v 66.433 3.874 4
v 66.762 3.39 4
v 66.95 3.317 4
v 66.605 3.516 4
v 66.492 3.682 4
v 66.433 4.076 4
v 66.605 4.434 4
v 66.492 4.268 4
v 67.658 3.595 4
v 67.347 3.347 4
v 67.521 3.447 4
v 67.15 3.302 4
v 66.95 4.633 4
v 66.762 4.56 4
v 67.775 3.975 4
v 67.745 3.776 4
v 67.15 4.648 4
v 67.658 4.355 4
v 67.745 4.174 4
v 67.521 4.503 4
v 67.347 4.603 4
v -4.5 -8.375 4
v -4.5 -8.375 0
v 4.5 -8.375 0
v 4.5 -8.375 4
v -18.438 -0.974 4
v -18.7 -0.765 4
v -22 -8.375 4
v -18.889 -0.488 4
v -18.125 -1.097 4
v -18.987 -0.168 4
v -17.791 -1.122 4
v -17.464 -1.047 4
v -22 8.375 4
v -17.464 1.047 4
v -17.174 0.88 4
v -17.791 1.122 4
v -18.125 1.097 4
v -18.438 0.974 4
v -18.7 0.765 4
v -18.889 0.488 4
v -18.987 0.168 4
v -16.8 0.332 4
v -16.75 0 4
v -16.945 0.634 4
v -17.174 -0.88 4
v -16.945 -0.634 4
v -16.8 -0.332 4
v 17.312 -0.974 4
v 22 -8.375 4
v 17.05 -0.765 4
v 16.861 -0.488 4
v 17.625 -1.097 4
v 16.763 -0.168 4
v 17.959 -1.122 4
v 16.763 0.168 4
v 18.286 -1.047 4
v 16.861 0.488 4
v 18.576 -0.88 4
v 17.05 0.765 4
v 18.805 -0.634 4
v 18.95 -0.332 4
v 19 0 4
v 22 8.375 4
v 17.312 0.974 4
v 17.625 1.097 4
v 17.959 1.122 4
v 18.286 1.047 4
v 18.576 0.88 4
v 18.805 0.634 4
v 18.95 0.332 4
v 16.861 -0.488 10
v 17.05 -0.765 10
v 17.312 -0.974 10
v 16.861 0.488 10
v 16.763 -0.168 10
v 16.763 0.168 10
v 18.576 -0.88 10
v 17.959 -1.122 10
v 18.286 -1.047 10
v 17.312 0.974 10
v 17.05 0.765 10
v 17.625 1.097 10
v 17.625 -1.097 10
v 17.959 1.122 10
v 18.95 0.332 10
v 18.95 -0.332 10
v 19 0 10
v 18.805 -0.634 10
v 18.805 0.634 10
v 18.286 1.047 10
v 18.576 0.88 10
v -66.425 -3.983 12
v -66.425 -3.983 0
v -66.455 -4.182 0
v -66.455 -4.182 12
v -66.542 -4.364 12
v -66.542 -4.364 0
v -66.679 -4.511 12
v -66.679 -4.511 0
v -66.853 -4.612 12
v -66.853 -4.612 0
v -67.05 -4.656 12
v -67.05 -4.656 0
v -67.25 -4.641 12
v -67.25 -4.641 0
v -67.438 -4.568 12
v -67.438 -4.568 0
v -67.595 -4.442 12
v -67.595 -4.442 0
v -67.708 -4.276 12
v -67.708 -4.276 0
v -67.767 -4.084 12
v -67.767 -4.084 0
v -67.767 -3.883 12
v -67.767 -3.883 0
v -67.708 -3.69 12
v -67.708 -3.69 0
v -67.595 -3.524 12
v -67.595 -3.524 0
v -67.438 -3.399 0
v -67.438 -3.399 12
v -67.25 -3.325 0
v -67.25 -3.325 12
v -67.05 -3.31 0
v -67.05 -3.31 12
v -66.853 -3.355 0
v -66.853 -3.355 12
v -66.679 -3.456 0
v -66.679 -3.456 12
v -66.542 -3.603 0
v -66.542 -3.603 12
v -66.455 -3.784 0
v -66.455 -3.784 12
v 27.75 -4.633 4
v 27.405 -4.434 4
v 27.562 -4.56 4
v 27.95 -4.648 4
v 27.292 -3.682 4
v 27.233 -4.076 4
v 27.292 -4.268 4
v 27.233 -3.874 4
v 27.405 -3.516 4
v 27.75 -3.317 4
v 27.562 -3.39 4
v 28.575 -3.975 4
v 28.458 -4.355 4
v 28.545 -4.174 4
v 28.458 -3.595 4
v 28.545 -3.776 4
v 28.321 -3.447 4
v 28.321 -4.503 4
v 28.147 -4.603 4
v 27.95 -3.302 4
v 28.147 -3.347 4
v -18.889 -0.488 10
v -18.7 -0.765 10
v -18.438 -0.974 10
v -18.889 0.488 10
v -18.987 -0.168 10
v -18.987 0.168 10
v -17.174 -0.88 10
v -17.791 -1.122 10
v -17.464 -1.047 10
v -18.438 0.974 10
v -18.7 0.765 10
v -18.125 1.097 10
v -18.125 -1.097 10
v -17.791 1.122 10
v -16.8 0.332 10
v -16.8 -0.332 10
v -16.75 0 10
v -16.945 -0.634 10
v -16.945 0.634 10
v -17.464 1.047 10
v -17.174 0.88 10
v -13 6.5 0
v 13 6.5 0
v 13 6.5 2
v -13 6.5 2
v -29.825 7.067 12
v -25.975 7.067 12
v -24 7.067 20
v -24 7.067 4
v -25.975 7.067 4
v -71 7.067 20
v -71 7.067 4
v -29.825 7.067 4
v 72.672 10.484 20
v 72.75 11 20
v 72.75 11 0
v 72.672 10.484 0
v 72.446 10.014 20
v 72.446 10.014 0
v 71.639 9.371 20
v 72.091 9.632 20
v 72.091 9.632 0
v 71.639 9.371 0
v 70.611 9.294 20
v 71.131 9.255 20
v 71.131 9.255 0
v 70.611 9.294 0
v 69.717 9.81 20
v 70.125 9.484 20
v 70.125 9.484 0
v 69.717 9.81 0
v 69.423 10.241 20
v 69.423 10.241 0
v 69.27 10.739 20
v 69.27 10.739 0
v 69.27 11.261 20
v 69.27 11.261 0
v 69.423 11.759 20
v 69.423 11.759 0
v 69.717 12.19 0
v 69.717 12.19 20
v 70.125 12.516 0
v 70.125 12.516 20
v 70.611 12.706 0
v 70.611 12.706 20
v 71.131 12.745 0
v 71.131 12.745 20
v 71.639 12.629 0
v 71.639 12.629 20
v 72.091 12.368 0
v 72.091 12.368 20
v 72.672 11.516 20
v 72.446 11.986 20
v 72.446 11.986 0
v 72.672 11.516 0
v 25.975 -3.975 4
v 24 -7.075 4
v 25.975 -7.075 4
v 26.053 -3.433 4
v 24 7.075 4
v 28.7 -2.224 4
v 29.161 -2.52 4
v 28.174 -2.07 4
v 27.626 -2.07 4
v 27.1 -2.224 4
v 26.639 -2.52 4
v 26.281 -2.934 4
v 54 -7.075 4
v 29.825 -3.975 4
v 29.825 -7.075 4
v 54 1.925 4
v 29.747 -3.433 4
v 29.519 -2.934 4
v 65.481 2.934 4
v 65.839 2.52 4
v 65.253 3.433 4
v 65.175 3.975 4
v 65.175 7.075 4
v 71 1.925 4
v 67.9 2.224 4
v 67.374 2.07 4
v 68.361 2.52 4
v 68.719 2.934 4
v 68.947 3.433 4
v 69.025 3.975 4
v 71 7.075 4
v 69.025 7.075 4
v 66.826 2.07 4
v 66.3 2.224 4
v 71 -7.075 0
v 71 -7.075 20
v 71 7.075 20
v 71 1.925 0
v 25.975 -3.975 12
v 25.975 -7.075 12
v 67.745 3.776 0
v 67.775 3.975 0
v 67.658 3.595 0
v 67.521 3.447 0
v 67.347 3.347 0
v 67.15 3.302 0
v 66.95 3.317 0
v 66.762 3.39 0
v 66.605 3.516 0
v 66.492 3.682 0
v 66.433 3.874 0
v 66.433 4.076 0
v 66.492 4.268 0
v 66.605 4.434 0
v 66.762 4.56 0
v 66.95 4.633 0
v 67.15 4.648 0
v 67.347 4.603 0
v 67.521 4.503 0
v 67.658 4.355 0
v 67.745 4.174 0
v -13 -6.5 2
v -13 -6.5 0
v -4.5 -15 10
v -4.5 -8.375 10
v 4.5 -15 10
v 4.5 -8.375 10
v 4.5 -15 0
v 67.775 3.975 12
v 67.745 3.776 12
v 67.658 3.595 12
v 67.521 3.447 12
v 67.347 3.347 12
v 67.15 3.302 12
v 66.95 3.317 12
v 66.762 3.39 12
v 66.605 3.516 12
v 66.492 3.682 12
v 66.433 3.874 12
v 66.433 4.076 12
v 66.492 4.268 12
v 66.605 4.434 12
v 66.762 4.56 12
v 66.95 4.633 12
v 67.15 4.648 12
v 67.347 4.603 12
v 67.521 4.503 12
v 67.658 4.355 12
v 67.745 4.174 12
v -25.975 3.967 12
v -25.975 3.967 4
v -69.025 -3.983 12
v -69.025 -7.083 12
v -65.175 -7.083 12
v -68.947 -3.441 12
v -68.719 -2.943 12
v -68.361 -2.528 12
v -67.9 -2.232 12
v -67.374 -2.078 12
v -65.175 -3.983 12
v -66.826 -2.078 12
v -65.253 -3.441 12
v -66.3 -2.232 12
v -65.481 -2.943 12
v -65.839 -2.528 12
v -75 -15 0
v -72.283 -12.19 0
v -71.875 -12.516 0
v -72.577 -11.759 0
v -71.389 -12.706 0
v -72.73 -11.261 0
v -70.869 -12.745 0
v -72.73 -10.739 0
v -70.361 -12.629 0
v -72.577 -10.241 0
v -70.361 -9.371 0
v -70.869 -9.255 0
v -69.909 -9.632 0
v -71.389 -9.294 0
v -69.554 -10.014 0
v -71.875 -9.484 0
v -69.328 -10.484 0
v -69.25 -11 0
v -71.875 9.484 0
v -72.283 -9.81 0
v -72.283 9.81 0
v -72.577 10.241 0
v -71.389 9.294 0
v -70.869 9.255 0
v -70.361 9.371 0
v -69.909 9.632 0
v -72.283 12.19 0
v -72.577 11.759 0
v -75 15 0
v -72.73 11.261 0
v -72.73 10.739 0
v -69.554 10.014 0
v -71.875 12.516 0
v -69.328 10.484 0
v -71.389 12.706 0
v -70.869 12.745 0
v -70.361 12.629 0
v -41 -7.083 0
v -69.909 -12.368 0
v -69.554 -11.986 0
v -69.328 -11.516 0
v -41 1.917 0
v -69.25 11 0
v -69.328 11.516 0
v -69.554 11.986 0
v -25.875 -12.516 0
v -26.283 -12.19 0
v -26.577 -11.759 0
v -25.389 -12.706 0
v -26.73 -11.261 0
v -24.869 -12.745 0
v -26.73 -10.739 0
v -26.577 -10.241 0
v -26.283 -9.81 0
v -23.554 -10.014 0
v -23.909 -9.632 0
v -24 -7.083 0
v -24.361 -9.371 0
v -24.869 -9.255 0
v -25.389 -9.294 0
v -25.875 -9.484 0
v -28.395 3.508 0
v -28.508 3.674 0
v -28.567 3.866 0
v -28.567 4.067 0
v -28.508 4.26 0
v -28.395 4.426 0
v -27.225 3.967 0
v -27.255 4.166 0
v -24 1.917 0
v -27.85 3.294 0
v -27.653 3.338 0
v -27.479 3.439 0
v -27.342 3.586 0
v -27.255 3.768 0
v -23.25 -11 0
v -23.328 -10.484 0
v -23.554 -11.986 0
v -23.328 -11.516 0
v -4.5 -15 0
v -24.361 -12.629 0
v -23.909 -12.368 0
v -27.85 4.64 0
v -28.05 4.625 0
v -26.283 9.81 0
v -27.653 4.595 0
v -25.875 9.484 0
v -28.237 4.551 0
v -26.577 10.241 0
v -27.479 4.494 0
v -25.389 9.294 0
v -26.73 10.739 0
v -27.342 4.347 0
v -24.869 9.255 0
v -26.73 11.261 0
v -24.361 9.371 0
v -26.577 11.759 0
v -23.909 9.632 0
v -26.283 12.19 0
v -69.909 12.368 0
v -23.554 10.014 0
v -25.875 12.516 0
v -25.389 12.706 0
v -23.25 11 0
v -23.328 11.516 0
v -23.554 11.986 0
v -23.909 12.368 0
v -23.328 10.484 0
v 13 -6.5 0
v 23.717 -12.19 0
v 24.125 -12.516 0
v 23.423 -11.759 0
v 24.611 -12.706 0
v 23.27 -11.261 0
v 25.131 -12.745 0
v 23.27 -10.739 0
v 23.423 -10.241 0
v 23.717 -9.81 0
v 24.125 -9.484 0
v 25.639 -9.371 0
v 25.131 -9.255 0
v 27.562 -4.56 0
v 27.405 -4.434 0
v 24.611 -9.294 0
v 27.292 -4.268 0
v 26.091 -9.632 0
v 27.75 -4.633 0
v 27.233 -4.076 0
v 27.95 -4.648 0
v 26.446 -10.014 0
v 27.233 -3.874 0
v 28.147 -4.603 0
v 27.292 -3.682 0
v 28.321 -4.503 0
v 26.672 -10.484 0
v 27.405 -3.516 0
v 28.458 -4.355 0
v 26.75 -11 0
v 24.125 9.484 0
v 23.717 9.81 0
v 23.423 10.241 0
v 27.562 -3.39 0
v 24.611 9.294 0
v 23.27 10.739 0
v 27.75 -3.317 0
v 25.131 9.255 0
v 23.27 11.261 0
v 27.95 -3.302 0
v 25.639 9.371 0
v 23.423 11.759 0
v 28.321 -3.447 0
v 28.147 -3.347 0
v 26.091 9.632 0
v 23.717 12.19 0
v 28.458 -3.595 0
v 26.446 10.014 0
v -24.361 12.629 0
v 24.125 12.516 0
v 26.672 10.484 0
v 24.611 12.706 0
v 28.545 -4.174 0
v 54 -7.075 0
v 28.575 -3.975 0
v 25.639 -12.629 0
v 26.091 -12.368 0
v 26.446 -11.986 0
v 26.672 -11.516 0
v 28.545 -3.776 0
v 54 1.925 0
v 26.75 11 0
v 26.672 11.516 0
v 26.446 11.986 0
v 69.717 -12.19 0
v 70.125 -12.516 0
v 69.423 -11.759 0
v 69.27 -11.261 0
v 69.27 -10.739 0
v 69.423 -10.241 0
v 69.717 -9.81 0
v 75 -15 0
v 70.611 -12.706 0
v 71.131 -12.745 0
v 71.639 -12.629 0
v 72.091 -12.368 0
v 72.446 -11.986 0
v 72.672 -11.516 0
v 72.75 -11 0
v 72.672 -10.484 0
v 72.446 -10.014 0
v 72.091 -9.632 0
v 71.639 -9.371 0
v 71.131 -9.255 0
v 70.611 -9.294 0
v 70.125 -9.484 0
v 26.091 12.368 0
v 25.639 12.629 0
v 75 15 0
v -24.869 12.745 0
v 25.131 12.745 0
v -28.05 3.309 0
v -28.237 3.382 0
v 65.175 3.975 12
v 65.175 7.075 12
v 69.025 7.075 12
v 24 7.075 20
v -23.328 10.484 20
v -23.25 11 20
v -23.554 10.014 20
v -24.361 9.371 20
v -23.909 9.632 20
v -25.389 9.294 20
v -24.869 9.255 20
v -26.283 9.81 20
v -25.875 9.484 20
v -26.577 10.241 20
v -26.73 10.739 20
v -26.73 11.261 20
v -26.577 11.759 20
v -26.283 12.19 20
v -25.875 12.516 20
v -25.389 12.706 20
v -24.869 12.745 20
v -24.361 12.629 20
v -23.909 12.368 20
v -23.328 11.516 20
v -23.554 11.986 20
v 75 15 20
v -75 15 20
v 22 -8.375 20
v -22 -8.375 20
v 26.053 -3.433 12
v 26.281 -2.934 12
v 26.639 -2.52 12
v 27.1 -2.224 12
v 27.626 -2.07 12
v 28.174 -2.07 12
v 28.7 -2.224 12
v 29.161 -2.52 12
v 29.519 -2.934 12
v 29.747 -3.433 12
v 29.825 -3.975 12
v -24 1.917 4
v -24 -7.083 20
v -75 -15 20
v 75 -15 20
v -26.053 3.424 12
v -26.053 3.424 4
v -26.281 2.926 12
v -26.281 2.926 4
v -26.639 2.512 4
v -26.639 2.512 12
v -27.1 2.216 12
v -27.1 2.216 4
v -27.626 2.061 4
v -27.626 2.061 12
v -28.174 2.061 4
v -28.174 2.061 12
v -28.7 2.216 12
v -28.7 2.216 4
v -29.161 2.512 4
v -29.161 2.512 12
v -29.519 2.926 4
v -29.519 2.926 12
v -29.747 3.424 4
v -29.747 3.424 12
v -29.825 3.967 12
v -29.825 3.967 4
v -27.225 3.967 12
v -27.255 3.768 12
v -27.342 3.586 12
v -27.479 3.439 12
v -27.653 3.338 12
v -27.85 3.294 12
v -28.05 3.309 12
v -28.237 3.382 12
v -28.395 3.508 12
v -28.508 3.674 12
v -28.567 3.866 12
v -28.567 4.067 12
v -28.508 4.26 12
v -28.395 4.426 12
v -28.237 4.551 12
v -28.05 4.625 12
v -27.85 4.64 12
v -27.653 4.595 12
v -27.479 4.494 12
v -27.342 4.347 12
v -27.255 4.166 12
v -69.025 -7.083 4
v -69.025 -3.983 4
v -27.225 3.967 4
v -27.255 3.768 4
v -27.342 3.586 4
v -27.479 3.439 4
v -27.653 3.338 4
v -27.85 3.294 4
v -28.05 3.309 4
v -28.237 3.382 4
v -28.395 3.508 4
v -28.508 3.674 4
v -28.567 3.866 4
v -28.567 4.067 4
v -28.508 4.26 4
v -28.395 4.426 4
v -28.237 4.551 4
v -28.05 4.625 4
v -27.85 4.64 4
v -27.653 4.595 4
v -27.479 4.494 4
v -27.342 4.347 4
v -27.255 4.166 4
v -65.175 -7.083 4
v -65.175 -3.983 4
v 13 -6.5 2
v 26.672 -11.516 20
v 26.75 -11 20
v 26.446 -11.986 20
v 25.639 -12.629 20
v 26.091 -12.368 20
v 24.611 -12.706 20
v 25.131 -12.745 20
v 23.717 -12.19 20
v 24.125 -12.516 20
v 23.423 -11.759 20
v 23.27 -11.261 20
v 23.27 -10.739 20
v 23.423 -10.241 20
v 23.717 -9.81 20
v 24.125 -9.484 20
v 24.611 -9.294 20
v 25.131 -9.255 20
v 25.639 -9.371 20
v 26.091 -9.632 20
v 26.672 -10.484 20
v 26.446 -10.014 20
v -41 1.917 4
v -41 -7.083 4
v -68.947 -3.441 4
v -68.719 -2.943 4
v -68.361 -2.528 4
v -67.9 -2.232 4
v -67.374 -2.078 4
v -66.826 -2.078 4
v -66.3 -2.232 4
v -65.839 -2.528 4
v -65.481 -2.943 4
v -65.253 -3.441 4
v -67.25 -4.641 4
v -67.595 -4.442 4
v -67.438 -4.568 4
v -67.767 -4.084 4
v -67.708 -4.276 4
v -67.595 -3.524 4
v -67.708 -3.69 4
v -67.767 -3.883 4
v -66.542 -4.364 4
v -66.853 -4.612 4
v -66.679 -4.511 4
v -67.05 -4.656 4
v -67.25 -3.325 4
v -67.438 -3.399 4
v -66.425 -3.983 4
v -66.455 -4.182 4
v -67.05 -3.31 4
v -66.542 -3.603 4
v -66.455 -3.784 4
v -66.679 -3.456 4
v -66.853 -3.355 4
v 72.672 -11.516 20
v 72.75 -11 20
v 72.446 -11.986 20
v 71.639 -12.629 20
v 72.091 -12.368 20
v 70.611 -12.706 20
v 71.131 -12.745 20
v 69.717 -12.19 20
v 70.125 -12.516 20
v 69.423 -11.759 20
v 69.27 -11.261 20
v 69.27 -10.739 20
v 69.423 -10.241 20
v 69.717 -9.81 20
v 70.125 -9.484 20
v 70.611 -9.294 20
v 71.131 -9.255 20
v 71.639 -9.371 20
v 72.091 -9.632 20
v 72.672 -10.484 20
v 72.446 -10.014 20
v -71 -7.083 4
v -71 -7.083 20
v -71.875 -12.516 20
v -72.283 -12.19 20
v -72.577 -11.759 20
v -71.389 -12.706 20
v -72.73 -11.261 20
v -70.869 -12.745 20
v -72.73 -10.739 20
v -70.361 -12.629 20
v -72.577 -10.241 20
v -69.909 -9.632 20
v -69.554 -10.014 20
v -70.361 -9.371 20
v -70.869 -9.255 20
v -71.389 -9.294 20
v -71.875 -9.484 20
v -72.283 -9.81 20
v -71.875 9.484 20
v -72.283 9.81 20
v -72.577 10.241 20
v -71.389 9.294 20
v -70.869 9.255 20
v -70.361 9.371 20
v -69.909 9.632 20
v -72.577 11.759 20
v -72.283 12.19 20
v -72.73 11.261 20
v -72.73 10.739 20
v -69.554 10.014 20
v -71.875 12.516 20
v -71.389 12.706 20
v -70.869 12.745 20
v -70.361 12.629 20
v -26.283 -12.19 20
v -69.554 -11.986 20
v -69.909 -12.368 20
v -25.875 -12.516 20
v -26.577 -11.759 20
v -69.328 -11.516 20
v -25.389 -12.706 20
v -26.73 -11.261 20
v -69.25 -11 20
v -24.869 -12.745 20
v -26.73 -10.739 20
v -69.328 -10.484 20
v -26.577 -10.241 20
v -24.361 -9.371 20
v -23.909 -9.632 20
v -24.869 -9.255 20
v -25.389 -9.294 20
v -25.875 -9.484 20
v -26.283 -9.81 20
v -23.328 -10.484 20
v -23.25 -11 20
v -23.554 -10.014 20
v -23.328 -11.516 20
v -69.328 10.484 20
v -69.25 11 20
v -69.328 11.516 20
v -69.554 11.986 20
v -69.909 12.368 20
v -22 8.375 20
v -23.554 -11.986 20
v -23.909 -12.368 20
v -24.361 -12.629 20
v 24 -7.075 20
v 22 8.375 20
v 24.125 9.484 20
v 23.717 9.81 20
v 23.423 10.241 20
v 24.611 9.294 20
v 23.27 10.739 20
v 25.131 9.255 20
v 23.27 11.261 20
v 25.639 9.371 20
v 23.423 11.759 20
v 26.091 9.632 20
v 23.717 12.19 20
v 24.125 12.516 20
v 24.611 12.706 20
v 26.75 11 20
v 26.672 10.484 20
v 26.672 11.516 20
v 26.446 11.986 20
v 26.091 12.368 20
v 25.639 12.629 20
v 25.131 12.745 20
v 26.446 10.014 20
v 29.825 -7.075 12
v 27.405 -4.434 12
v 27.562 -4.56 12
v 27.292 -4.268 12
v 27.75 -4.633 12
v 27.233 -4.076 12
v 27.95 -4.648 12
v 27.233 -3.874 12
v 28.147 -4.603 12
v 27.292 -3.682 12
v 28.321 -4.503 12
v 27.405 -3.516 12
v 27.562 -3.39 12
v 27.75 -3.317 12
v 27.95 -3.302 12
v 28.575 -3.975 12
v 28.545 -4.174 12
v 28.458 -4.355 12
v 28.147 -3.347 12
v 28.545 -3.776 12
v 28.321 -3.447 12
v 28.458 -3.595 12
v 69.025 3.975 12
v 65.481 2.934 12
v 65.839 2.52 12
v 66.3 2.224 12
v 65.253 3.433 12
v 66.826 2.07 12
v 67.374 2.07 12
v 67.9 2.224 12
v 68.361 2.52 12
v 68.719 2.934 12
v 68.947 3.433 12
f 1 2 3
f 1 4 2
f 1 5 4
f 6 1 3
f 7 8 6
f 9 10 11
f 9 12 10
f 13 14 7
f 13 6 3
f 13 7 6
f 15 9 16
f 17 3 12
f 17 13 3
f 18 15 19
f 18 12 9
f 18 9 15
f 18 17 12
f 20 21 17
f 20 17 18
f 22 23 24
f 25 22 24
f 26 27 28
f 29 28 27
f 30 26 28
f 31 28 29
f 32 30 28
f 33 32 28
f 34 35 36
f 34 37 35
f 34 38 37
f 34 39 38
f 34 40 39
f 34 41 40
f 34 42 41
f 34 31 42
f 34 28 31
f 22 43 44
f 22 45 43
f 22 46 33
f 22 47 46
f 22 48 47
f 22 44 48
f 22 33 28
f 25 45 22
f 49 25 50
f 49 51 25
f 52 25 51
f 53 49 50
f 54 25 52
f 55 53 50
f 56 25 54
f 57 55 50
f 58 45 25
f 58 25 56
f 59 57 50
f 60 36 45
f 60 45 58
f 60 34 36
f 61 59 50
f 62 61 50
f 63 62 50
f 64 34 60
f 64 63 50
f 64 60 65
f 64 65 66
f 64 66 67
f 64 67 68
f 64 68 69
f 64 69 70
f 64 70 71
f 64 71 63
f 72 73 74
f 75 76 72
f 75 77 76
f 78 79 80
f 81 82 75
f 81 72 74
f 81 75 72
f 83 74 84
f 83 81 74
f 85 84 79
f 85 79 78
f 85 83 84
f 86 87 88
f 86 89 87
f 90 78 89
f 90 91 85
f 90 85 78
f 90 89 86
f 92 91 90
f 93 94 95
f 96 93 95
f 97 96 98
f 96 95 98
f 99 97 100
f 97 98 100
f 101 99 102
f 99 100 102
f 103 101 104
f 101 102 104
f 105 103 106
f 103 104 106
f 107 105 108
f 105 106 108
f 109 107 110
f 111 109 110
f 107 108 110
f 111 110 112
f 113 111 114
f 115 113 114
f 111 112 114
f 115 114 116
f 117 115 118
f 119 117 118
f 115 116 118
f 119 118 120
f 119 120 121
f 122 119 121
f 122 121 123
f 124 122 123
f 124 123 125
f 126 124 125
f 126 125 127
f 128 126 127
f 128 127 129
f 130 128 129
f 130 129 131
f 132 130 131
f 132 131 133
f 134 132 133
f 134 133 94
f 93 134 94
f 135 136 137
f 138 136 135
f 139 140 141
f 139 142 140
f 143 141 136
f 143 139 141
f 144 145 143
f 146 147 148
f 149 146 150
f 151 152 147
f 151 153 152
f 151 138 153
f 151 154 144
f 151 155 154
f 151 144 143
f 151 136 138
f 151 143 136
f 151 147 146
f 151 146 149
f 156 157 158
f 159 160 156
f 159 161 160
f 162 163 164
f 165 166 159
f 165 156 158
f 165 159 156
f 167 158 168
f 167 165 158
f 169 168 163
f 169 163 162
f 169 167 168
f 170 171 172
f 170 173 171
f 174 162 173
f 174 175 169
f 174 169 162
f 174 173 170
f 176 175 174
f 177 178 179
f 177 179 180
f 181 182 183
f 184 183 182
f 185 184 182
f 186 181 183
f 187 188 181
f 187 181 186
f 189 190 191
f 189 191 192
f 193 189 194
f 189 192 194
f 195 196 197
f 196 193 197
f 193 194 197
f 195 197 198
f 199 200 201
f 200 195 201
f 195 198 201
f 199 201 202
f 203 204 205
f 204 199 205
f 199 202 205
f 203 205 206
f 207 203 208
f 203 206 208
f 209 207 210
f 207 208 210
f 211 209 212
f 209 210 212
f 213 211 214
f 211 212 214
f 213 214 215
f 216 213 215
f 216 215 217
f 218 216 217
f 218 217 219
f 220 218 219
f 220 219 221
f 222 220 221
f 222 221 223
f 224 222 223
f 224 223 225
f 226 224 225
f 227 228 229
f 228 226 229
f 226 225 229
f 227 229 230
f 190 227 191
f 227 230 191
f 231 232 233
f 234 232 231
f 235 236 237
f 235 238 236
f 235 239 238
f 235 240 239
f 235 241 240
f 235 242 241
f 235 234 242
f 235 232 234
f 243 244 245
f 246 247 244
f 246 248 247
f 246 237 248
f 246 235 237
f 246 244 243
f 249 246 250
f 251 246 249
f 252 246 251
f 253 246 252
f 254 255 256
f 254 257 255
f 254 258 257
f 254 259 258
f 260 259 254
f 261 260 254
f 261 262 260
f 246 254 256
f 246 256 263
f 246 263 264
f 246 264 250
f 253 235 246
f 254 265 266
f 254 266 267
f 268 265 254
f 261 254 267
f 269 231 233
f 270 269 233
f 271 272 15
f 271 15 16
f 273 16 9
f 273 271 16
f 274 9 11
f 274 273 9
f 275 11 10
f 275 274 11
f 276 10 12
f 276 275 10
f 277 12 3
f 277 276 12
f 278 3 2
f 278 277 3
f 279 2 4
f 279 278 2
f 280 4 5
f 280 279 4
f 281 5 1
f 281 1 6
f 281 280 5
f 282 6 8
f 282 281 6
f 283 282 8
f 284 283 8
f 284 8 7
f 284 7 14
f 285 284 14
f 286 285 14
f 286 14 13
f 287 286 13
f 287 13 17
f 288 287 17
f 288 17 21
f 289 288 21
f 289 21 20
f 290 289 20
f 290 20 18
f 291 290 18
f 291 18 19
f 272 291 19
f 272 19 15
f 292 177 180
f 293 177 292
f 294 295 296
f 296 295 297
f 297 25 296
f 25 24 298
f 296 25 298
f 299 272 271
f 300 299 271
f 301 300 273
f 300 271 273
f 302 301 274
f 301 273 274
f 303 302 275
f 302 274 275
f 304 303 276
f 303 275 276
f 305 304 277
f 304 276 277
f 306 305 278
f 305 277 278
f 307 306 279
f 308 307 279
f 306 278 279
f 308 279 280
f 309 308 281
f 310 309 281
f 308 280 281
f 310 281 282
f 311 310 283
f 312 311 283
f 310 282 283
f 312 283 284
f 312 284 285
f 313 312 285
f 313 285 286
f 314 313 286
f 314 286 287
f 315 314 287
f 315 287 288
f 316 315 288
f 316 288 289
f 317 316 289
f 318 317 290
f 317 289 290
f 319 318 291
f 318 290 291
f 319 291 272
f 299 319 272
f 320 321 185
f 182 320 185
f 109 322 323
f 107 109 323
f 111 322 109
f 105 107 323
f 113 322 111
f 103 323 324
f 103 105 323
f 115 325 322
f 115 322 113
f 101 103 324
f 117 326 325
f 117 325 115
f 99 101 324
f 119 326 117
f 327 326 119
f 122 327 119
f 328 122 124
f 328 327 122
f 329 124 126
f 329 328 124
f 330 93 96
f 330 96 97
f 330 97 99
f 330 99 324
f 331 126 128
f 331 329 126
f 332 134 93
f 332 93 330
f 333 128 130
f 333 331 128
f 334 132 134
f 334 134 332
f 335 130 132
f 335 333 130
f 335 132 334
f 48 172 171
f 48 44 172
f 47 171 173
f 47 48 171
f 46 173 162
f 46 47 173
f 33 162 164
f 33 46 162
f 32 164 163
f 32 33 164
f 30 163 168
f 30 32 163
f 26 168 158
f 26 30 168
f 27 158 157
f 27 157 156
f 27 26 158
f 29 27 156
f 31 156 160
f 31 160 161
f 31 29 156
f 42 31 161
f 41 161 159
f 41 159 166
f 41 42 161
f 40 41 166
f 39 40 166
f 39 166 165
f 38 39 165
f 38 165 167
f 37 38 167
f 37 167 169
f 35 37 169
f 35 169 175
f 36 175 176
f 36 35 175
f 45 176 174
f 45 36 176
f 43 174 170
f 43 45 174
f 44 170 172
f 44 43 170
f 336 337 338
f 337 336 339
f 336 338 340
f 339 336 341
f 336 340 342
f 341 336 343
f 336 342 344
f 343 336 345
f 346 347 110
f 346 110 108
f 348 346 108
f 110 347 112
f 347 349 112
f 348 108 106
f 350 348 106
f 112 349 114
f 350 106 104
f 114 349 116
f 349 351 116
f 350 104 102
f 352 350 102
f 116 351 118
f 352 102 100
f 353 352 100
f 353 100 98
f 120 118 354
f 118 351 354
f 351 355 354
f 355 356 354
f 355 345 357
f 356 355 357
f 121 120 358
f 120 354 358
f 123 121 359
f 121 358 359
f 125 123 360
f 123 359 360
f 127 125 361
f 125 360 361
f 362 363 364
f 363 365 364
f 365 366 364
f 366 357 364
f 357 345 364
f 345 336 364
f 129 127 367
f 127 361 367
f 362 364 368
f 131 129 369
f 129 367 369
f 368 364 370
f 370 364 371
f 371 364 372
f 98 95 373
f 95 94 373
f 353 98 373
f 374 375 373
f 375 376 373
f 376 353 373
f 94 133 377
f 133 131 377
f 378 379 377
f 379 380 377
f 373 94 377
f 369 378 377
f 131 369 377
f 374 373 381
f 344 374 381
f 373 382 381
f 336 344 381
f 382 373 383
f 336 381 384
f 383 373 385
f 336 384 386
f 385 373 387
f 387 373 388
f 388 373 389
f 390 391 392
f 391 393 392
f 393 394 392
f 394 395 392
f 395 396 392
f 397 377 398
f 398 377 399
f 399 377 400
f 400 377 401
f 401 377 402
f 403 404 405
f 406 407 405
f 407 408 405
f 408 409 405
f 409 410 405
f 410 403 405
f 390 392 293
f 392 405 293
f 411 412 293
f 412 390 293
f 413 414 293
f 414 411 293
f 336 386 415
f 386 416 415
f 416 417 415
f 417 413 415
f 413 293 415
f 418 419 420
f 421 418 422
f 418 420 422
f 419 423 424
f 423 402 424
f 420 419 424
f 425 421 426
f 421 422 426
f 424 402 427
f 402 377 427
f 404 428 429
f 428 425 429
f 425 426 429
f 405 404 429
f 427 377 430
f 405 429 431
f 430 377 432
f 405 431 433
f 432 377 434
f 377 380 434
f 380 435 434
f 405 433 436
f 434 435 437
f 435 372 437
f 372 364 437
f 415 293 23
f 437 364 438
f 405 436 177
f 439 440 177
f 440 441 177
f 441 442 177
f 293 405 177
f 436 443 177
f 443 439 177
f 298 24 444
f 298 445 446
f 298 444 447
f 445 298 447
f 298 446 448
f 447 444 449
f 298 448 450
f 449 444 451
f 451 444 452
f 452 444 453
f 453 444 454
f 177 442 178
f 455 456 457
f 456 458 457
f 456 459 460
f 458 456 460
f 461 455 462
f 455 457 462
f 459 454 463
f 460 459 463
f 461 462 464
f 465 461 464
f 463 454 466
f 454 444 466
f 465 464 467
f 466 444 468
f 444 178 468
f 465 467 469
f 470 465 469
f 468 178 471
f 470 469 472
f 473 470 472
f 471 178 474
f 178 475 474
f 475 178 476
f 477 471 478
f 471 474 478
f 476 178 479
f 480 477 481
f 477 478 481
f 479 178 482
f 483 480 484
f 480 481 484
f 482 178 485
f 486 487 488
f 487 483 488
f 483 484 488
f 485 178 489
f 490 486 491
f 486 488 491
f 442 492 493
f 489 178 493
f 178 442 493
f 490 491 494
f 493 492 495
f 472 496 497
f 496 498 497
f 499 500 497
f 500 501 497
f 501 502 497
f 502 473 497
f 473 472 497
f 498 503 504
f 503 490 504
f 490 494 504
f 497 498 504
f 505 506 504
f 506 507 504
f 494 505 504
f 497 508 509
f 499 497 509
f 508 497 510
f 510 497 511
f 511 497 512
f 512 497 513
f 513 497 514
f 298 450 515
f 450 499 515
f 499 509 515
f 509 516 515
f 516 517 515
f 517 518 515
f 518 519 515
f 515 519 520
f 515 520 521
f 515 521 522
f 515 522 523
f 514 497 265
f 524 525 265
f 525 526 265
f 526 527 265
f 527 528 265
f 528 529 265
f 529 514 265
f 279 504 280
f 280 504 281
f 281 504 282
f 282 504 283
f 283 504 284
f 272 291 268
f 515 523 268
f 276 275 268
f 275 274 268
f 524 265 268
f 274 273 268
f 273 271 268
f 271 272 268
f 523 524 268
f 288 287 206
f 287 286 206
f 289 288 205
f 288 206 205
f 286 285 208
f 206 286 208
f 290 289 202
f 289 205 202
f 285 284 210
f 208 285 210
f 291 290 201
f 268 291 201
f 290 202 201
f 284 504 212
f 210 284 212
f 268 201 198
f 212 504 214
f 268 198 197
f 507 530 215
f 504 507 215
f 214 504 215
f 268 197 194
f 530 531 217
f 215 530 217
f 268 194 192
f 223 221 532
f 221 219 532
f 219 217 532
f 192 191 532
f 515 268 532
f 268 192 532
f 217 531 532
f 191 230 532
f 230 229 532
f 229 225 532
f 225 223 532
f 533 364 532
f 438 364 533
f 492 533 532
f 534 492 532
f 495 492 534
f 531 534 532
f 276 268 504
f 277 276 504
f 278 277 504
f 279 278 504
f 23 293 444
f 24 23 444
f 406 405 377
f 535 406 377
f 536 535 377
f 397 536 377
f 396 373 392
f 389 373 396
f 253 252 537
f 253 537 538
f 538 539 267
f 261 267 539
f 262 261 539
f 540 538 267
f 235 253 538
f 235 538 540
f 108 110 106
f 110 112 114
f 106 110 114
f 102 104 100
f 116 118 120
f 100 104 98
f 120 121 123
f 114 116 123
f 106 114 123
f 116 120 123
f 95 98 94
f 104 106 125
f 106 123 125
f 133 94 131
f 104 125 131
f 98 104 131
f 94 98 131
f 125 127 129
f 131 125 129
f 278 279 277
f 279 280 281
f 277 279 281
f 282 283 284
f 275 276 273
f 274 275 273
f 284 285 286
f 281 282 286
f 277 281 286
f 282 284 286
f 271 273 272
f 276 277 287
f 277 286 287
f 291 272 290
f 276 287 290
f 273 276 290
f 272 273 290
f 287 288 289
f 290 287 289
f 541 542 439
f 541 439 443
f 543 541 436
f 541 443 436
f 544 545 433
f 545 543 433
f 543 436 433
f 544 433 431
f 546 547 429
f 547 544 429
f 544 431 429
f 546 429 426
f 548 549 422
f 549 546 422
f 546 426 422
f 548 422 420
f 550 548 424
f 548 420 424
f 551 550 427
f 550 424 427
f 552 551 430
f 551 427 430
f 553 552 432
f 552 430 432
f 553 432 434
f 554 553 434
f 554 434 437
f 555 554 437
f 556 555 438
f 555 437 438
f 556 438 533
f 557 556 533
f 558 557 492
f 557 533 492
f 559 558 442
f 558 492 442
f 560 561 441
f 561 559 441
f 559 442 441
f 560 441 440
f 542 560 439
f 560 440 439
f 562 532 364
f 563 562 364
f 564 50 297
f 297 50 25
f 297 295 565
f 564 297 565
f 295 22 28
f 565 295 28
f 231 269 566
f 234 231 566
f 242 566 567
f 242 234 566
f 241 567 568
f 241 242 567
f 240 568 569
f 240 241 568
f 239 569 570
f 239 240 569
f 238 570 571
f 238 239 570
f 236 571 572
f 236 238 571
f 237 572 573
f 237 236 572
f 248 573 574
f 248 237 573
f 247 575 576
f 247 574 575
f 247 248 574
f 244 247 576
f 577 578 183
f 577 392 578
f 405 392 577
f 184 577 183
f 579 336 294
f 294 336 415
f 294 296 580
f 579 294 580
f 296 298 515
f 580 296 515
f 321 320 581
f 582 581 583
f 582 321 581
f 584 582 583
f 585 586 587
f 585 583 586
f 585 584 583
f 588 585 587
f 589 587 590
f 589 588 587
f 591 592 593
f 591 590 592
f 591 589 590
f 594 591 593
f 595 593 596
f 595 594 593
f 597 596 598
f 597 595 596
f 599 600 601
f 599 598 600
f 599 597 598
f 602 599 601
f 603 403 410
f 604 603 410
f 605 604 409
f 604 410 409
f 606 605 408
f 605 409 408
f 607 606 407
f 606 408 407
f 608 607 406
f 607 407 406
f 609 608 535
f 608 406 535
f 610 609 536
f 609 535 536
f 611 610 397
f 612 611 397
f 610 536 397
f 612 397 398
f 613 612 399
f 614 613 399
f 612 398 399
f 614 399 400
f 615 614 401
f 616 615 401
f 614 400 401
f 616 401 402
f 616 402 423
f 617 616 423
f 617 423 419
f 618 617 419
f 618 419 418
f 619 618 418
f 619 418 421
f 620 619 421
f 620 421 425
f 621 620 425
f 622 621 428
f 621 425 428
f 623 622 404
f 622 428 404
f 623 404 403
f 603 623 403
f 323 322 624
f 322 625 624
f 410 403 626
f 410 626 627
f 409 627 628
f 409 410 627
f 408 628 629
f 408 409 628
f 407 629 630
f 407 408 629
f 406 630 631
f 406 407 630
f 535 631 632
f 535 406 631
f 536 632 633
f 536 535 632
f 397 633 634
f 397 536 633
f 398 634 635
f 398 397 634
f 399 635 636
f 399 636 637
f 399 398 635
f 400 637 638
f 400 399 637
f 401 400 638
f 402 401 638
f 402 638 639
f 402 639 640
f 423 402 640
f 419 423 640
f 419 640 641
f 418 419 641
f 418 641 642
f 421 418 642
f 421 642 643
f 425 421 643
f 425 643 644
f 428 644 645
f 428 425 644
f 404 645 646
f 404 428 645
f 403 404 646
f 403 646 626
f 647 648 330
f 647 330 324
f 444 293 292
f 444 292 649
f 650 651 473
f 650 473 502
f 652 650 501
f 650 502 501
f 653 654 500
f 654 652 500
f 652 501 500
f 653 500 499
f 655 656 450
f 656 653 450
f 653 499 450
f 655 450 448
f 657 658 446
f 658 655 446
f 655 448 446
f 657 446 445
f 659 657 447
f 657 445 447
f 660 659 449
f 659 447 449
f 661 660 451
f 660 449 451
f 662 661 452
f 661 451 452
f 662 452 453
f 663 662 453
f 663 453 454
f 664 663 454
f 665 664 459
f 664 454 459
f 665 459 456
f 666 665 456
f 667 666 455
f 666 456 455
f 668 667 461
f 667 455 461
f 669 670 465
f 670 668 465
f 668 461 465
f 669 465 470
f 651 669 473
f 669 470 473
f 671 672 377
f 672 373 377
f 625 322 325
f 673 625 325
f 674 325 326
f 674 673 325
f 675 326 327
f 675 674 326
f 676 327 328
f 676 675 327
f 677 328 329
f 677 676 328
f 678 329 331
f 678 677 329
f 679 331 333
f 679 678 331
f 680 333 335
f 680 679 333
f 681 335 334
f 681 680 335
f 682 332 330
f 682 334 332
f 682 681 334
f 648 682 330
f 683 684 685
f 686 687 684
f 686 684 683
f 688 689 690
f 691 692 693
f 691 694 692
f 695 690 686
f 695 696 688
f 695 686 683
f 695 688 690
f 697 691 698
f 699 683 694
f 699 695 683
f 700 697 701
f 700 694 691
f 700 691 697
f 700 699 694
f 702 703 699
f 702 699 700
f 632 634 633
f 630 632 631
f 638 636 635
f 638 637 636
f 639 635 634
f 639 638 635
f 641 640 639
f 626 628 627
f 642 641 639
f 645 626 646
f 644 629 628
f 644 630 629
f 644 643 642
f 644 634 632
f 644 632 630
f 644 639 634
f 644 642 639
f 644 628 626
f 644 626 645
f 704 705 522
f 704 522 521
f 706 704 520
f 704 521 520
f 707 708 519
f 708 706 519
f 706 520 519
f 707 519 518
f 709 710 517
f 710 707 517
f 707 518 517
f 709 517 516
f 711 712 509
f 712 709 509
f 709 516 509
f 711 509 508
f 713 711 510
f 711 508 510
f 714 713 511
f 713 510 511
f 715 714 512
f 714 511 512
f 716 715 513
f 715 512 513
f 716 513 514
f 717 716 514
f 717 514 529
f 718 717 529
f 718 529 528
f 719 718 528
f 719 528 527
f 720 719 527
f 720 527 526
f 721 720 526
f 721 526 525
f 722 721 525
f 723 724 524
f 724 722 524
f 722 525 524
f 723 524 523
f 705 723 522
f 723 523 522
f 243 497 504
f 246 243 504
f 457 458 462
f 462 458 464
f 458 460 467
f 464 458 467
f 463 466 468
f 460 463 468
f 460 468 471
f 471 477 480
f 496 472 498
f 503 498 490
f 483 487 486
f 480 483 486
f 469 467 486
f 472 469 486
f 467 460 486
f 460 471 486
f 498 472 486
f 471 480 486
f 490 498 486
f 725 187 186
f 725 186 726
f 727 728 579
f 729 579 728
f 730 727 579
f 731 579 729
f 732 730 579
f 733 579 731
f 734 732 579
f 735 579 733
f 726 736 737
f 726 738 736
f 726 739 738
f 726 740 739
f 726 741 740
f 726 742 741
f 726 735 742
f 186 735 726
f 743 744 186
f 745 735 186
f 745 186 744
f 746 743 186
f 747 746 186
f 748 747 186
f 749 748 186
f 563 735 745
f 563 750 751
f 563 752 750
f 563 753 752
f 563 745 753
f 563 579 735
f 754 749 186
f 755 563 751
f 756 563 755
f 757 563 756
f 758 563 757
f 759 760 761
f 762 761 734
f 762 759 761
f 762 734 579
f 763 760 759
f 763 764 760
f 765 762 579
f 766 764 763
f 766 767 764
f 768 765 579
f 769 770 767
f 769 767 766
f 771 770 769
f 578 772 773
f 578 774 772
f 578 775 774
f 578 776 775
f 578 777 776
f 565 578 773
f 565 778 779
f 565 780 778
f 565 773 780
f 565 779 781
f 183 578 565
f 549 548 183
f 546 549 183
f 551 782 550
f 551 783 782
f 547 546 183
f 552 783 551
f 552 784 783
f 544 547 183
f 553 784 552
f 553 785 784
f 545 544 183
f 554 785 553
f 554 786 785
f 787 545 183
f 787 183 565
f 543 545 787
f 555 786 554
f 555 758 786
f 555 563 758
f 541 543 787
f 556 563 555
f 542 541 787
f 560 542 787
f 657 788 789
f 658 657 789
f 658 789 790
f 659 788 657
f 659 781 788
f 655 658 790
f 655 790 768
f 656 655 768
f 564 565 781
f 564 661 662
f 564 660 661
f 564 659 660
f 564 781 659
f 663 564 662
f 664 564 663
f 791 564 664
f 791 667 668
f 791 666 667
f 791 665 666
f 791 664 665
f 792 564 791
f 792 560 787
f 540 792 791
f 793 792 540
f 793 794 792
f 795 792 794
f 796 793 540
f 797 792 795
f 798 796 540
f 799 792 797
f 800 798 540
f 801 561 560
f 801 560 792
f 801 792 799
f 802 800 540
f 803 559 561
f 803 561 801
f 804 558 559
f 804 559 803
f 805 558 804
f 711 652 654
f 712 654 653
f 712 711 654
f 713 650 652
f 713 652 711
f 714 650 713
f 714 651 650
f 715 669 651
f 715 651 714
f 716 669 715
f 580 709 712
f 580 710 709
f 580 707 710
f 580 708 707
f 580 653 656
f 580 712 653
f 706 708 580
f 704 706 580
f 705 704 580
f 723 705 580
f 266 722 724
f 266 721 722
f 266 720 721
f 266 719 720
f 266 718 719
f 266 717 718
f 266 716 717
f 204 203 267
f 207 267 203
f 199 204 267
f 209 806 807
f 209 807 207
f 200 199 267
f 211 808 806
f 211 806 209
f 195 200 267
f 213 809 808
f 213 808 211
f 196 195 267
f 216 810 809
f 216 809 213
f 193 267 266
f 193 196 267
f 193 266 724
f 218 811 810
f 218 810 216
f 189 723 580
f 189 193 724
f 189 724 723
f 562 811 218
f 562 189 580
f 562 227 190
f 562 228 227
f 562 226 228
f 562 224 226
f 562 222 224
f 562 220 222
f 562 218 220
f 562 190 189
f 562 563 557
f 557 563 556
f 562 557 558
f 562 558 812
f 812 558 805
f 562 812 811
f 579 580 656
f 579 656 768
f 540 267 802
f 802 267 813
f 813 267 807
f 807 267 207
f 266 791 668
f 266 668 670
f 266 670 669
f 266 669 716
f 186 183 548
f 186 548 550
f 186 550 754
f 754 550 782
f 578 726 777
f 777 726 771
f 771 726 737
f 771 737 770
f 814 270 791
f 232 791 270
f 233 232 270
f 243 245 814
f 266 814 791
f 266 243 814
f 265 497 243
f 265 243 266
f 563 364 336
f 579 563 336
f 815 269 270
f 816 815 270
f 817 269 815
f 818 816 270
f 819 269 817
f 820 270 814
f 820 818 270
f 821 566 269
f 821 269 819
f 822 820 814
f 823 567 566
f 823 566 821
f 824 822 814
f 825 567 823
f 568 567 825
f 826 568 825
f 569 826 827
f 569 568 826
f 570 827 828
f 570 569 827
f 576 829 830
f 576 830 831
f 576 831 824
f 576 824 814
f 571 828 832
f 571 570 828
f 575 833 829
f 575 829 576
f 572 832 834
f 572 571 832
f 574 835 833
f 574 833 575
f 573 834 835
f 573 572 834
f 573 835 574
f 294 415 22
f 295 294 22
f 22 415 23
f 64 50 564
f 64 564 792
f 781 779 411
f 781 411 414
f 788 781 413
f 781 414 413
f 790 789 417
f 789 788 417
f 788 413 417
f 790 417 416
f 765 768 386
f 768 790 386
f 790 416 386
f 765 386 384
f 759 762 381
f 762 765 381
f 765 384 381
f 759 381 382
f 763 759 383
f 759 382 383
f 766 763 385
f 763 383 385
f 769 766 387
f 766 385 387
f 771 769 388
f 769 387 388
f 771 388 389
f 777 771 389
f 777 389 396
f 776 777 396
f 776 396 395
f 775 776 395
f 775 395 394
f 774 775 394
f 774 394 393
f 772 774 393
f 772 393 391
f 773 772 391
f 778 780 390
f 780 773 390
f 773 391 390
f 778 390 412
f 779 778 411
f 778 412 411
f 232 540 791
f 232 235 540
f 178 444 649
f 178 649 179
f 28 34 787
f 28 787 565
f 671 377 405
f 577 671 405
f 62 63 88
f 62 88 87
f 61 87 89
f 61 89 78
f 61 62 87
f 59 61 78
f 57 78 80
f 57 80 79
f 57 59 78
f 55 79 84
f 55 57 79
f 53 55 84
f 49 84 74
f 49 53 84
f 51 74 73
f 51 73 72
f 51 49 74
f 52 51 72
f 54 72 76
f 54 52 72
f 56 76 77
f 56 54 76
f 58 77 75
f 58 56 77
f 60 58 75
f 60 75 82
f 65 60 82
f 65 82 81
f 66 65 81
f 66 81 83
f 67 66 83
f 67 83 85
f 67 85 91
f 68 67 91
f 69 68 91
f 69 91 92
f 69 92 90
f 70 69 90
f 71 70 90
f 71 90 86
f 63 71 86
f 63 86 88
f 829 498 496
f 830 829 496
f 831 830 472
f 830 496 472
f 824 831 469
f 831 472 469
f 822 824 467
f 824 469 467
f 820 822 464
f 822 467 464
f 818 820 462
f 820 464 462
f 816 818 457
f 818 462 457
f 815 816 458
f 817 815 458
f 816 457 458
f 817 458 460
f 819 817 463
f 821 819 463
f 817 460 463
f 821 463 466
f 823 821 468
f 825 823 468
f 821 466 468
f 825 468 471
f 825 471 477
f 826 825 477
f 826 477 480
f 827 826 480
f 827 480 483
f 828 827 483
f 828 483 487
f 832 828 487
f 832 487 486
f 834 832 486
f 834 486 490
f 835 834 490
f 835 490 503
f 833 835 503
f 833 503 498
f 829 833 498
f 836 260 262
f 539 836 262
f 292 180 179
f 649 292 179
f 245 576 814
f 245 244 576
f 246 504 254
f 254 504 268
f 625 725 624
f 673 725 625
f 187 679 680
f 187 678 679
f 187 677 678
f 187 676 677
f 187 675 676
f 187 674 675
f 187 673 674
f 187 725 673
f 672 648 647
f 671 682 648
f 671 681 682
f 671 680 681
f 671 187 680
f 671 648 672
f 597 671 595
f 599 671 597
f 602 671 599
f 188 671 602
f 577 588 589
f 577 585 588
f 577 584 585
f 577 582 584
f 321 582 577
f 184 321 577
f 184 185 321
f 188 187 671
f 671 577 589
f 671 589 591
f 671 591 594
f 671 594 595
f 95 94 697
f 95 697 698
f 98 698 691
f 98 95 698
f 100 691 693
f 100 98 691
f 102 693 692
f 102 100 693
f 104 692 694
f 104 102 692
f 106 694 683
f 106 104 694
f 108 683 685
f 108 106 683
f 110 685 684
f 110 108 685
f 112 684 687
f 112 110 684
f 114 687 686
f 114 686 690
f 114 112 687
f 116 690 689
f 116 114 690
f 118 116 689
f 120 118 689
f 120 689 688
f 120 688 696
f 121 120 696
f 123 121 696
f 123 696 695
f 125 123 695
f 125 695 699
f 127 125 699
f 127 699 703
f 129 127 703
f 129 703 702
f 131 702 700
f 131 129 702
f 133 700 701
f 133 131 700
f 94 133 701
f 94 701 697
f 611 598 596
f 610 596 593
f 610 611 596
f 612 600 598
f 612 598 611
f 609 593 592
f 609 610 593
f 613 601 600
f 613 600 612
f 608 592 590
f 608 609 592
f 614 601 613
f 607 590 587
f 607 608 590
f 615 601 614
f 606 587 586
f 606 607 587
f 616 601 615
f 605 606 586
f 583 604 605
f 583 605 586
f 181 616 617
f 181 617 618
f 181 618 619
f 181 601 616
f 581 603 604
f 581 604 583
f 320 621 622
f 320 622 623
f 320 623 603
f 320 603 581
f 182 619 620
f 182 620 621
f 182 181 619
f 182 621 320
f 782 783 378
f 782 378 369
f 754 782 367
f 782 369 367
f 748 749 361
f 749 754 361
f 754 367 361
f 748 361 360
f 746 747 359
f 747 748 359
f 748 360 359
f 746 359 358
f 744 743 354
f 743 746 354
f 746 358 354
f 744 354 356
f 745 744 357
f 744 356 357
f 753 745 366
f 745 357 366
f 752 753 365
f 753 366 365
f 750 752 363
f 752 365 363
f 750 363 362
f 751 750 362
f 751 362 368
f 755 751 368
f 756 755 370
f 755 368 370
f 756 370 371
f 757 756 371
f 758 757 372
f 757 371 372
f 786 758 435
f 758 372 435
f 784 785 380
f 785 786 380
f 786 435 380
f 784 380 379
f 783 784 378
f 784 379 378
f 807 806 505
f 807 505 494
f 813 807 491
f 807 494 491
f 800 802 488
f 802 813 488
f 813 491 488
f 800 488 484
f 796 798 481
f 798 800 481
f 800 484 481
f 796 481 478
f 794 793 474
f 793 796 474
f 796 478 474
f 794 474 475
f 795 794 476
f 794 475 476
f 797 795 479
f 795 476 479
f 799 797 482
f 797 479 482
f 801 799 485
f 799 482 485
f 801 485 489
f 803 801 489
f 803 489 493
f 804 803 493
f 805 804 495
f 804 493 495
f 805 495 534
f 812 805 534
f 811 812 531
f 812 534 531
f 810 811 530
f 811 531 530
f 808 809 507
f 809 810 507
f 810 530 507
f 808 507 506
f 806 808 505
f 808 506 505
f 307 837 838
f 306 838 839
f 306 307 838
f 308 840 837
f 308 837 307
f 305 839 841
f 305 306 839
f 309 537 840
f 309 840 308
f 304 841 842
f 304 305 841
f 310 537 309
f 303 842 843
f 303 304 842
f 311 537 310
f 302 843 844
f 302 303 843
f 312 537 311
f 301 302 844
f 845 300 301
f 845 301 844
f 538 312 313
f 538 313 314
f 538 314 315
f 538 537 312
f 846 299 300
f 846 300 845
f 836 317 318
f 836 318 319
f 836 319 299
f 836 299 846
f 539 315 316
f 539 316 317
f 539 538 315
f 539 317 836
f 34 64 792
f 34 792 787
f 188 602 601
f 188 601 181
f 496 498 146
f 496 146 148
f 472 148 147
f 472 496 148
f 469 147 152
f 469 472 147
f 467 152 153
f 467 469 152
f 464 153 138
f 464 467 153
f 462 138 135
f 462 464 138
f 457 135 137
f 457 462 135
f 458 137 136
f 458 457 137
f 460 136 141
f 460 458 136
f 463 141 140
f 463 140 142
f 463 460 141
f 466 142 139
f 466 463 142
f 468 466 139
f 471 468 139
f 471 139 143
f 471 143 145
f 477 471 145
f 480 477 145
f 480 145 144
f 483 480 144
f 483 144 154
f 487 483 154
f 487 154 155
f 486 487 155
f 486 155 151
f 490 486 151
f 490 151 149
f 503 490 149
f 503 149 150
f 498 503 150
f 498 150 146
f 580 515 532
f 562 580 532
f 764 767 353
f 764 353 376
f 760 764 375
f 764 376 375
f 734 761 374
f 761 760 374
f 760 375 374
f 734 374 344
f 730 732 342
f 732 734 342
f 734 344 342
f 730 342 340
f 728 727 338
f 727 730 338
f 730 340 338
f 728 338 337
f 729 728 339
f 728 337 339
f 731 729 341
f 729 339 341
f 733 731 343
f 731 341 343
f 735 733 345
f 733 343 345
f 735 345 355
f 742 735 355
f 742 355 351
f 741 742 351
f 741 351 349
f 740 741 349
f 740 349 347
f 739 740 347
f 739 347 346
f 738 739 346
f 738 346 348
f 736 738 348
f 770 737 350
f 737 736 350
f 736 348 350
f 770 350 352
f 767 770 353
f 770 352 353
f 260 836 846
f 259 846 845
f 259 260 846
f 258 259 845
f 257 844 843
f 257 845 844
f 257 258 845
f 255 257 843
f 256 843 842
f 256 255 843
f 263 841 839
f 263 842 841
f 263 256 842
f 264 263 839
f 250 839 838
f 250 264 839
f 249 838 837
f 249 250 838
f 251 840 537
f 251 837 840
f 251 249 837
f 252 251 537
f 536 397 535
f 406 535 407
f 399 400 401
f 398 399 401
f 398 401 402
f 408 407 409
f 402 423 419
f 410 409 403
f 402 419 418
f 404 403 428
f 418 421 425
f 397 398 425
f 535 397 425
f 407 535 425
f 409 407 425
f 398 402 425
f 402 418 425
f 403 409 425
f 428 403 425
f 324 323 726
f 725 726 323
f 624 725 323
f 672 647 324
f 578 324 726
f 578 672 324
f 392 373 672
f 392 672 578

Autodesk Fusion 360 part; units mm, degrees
sketch "Sketch1" plane through (0, 0, 0) normal (0, 0, 1) x (1, 0, 0)
  line L0 (-70, -6.0833) -> (-25, -6.0833)
  line L1 (-25, -6.0833) -> (-25, 6.0667)
  line L2 (-25, 6.0667) -> (-70, 6.0667)
  line L3 (-70, 6.0667) -> (-70, -6.0833)
  circle A0 centre (-27.9, 3.9667) radius 0.925
  line L4 (-70, -0.0083) -> (-25, -0.0083)
  line L5 (-47.5, 6.0667) -> (-47.5, -6.0833)
  circle A1 centre (-67.1, -3.9833) radius 0.925
  line L6 (16.5, 7.375) -> (-16.5, 7.375)
  line L7 (-16.5, -7.375) -> (16.5, -7.375)
  line L8 (16.5, -7.375) -> (16.5, 7.375)
  line L9 (19, 0) -> (21, 0)
  line L10 (16.5, 0) -> (19, 0)
  circle A2 centre (17.875, 0) radius 3.125
  circle A3 centre (17.875, 0) radius 1.125
  line L11 (-16.5, 7.375) -> (-16.5, -7.375)
  line L12 (3.5, -12.375) -> (-3.5, -7.375) construction
  line L13 (-19, 0) -> (-21, 0)
  line L14 (0, 7.375) -> (0, -12.375)
  line L15 (3.5, -7.375) -> (3.5, -12.375)
  line L16 (-3.5, -12.375) -> (3.5, -7.375) construction
  circle A4 centre (-17.875, 0) radius 3.125
  circle A5 centre (-17.875, 0) radius 1.125
  line L17 (-16.5, 0) -> (16.5, 0)
  line L18 (-16.5, 0) -> (-19, 0)
  line L19 (3.5, -12.375) -> (-3.5, -12.375)
  line L20 (-3.5, -7.375) -> (3.5, -7.375)
  line L21 (-3.5, -12.375) -> (-3.5, -7.375)
  line L22 (75, 15) -> (-75, 15)
  line L23 (-75, 15) -> (-75, -15)
  line L24 (-75, -15) -> (75, -15)
  line L25 (75, -15) -> (75, 15)
  line L26 (75, 15) -> (-75, -15) construction
  line L27 (-75, 15) -> (75, -15) construction
  line L28 (-24, 7.0667) -> (-71, 7.0667)
  line L29 (-71, 7.0667) -> (-71, -7.0833)
  line L30 (-71, -7.0833) -> (-24, -7.0833)
  line L31 (-24, -7.0833) -> (-24, 7.0667)
  line L32 (-4.5, -6.375) -> (4.5, -6.375)
  line L33 (4.5, -6.375) -> (4.5, -13.375)
  line L34 (4.5, -13.375) -> (-4.5, -13.375)
  line L35 (-4.5, -13.375) -> (-4.5, -6.375)
  line L36 (-21, 0) -> (-22, 0)
  line L37 (-17.5, -8.375) -> (17.5, -8.375)
  line L38 (17.5, -8.375) -> (17.5, 8.375)
  line L39 (17.5, 8.375) -> (-17.5, 8.375)
  line L40 (-17.5, 8.375) -> (-17.5, -8.375)
  line L41 (-22, 7.375) -> (-22, 0)
  line L42 (-17.5, -8.375) -> (-22, -8.375)
  line L43 (-22, -8.375) -> (-22, 0)
  line L44 (-17.5, 8.375) -> (-22, 8.375)
  line L45 (-22, 8.375) -> (-22, 7.375)
  line L46 (21, 0) -> (22, 0)
  line L47 (22, 0) -> (22, 8.375)
  line L48 (22, 8.375) -> (17.5, 8.375)
  line L49 (22, 0) -> (22, -8.375)
  line L50 (22, -8.375) -> (17.5, -8.375)
  circle A6 centre (-67.1, -3.9833) radius 0.675
  circle A7 centre (-27.9, 3.9667) radius 0.675
  circle A8 centre (-27.9, 3.9667) radius 1.925
  circle A9 centre (-67.1, -3.9833) radius 1.925
  line L51 (12, 5.5) -> (-12, 5.5)
  line L52 (-12, 5.5) -> (-12, -5.5)
  line L53 (-12, -5.5) -> (12, -5.5)
  line L54 (12, -5.5) -> (12, 5.5)
  line L55 (12, 5.5) -> (-12, -5.5) construction
  line L56 (-12, 5.5) -> (12, -5.5) construction
  circle A10 centre (-9.2, 0) radius 1.5
  line L57 (-7.7, 0) -> (-6.7, 0)
  line L58 (-6.7, 0) -> (-6.7, -5.5)
  line L59 (-6.7, 0) -> (-6.7, 5.5)
  line L60 (-13, -6.5) -> (13, -6.5)
  line L61 (13, -6.5) -> (13, 6.5)
  line L62 (13, 6.5) -> (-13, 6.5)
  line L63 (-13, 6.5) -> (-13, -6.5)
  circle A11 centre (-71, -11) radius 1.75
  circle A12 centre (71, -11) radius 1.75
  circle A13 centre (-71, 11) radius 1.75
  circle A14 centre (71, 11) radius 1.75
  circle A15 centre (-25, 11) radius 1.75
  circle A16 centre (25, 11) radius 1.75
  circle A17 centre (-25, -11) radius 1.75
  circle A18 centre (25, -11) radius 1.75
  line L64 (-27.9, 3.9667) -> (-29.825, 3.9667)
  line L65 (-29.825, 3.9667) -> (-29.825, 7.0667)
  line L66 (-27.9, 3.9667) -> (-25.975, 3.9667)
  line L67 (-25.975, 3.9667) -> (-25.975, 7.0667)
  line L68 (-24, -7.0833) -> (-41, -7.0833)
  line L69 (-41, -7.0833) -> (-41, 1.9167)
  line L70 (-41, 1.9167) -> (-24, 1.9167)
  line L71 (-24, 1.9167) -> (-24, -7.0833)
  line L72 (-67.1, -3.9833) -> (-65.175, -3.9833)
  line L73 (-67.1, -3.9833) -> (-69.025, -3.9833)
  line L74 (-65.175, -3.9833) -> (-65.175, -7.0833)
  line L75 (-69.025, -3.9833) -> (-69.025, -7.0833)
  line L76 (25, 6.075) -> (25, -6.075)
  line L77 (25, -6.075) -> (70, -6.075)
  line L78 (70, 6.075) -> (25, 6.075)
  line L79 (71, -7.075) -> (71, 7.075)
  line L80 (24, 7.075) -> (24, -7.075)
  line L81 (24, -7.075) -> (71, -7.075)
  line L82 (71, 7.075) -> (24, 7.075)
  line L83 (25, 0) -> (70, 0)
  line L84 (47.5, 6.075) -> (47.5, -6.075)
  line L85 (71, -7.075) -> (54, -7.075)
  line L86 (54, -7.075) -> (54, 1.925)
  line L87 (71, 1.925) -> (71, -7.075)
  line L88 (54, 1.925) -> (71, 1.925)
  line L89 (25.975, -3.975) -> (25.975, -7.075)
  circle A19 centre (27.9, -3.975) radius 1.925
  circle A20 centre (27.9, -3.975) radius 0.925
  circle A21 centre (27.9, -3.975) radius 0.675
  line L90 (27.9, -3.975) -> (25.975, -3.975)
  line L91 (27.9, -3.975) -> (29.825, -3.975)
  line L92 (29.825, -3.975) -> (29.825, -7.075)
  line L93 (67.1, 3.975) -> (65.175, 3.975)
  circle A22 centre (67.1, 3.975) radius 1.925
  line L94 (65.175, 3.975) -> (65.175, 7.075)
  circle A23 centre (67.1, 3.975) radius 0.675
  circle A24 centre (67.1, 3.975) radius 0.925
  line L95 (67.1, 3.975) -> (69.025, 3.975)
  line L96 (69.025, 3.975) -> (69.025, 7.075)
  line L97 (4.5, -13.375) -> (4.5, -15)
  line L98 (-4.5, -13.375) -> (-4.5, -15)
  point P0 (-47.5, -0.0083)
  dimension "d2" = 12.15
  dimension "d5" = 1.85
  dimension "d22" = 1.85
  dimension "d47" = 2
  dimension "d48" = 2
  dimension "d49" = 33
  dimension "d51" = 2.5
  dimension "d52" = 2.5
  dimension "d53" = 2.25
  dimension "d54" = 2.25
  dimension "d55" = 7
  dimension "d56" = 5
  dimension "d57" = 150
  dimension "d58" = 30
  dimension "d63" = 1
  dimension "d83" = 24
  dimension "d84" = 11
  dimension "d85" = 3
  dimension "d87" = 1
  dimension "d93" = 3.5
  dimension "d94" = 3.5
  dimension "d96" = 3.5
  dimension "d97" = 3.5
  dimension "d98" = 3.5
  dimension "d99" = 3.5
  dimension "d100" = 3.5
  dimension "d105" = 17
  dimension "d106" = 9
  dimension "d107" = 12.15
  dimension "d108" = 1.85
  dimension "d109" = 1.85
  dimension "d110" = 17
  dimension "d111" = 9
extrude "Extrude3" add sketch "Sketch1" along normal blind 20 contours L22 L23 L24 L25 L33 L35 L37 L39 L41 L42 L43 L44 L45 L47 L48 L49 L50 L97 L98 | L15 L19 L21 L33 L34 L35 L37 | L14 L15 L19 L37 | L24 L34 L97 L98 | L14 L19 L21 L37 makes body 1
extrude "Extrude4" add sketch "Sketch1" along normal blind 4 contours L0 L3 L4 L5 A9 L74 L75 | L0 L2 L3 L28 L29 L30 L65 L75 | L2 L3 L4 L5 | L0 L30 L69 L74 | L1 L2 L4 L5 A8 L65 L67 L69 L70 | L0 L4 L5 L69 | A6 L72 L73 | A6 L72 L73 | L1 L2 L28 L31 L67 L70 | A7 L64 L66 | A7 L64 L66 | L6 L8 A2 L14 L17 L61 L62 | L6 L8 A2 L11 A4 L38 L39 L40 | L6 L11 L14 A4 L17 L62 L63 | L8 L10 A2 A3 L38 | L8 A2 L17 | L14 L17 L51 L54 L61 L62 | L14 L17 L51 L52 L62 L63 | L8 L10 A2 A3 L38 | L8 A2 L17 | A2 L38 L46 L47 L48 | L9 A2 A3 L38 | L7 L8 A2 L17 L33 L60 L61 | L11 A4 L17 | L11 A4 A5 L18 L40 | L14 L17 L51 L54 | L14 L17 L51 L59 | L7 L8 A2 L33 L37 L38 | L9 A2 A3 L38 | A2 L38 L46 L49 L50 | L14 L17 L32 L33 L53 L54 L60 L61 | L11 A4 L17 | L11 A4 A5 L18 L40 | L7 L11 A4 L17 L35 L60 L63 | L13 A4 A5 L40 | A4 L36 L40 L41 L44 L45 | L14 L17 L53 L54 | L14 L17 L53 L58 | L17 L51 L52 A10 L57 L59 | L14 L17 L32 L35 L52 L53 L60 L63 | L7 L11 A4 L35 L37 L40 | L13 A4 A5 L40 | A4 L36 L40 L42 L43 | L17 L52 L53 A10 L57 L58 | L7 L15 L33 L37 | L7 L14 L20 L33 L60 | L14 L32 L33 L60 | L14 L32 L35 L60 | L17 A10 | L17 A10 | L7 L14 L20 L35 L60 | L7 L14 L15 L20 L37 | L7 L21 L35 L37 | L7 L14 L20 L21 L37 | L76 L78 L83 L84 | L76 L77 L78 L80 L81 L82 L89 L94 | L76 L77 L83 L84 L89 A19 L92 | L78 L79 L82 L83 L84 L86 L88 A22 L94 L96 | L77 L83 L84 L86 | L77 L81 L86 L92 | L93 A23 L95 | L93 A23 L95 | A21 L90 L91 | A21 L90 L91 bodies 1 makes body 2 at (-27.685, 4.6066, 1.3333) makes body 3 at (-67.4079, -4.584, 2.6667) makes body 4 at (28.115, -3.3351, 1.3333) makes body 5 at (67.3776, 4.5903, 2.6667)
extrude "Extrude5" add sketch "Sketch1" along normal blind 12 contours L0 A9 L74 L75 | L0 L30 L74 L75 | A1 A9 L72 L73 | A1 A9 L72 L73 | A1 A6 L72 L73 | A1 A6 L72 L73 | L2 L28 L65 L67 | L2 A8 L65 L67 | A0 A8 L64 L66 | A0 A8 L64 L66 | A0 A7 L64 L66 | A0 A7 L64 L66 | L78 L82 L94 L96 | L78 A22 L94 L96 | L77 L89 A19 L92 | L77 L81 L89 L92 | L93 A22 A24 L95 | L93 A22 A24 L95 | A19 A20 L90 L91 | A19 A20 L90 L91 | L93 A23 A24 L95 | L93 A23 A24 L95 | A20 A21 L90 L91 | A20 A21 L90 L91 bodies 1
extrude "Extrude6" cut sketch "Sketch1" along normal blind 2 contours L14 L17 L51 L54 L61 L62 | L14 L17 L51 L52 L62 L63 | L14 L17 L51 L54 | L14 L17 L51 L59 | L14 L17 L32 L33 L53 L54 L60 L61 | L14 L17 L53 L54 | L14 L17 L53 L58 | L17 L51 L52 A10 L57 L59 | L14 L17 L32 L35 L52 L53 L60 L63 | L17 L52 L53 A10 L57 L58 | L14 L32 L33 L60 | L14 L32 L35 L60 | L17 A10 | L17 A10 bodies 1
extrude "Extrude7" cut sketch "Sketch1" along normal blind 10 contours L15 L19 L21 L33 L34 L35 L37 | L14 L15 L19 L37 | L24 L34 L97 L98 | L14 L19 L21 L37 bodies 1
extrude "Extrude9" add sketch "Sketch1" along normal blind 10 contours L10 A3 L38 | L10 A3 L38 | L10 A3 L38 | L10 A3 L38 | A5 L18 L40 | A5 L18 L40 | A5 L18 L40 | A5 L18 L40 bodies 1
